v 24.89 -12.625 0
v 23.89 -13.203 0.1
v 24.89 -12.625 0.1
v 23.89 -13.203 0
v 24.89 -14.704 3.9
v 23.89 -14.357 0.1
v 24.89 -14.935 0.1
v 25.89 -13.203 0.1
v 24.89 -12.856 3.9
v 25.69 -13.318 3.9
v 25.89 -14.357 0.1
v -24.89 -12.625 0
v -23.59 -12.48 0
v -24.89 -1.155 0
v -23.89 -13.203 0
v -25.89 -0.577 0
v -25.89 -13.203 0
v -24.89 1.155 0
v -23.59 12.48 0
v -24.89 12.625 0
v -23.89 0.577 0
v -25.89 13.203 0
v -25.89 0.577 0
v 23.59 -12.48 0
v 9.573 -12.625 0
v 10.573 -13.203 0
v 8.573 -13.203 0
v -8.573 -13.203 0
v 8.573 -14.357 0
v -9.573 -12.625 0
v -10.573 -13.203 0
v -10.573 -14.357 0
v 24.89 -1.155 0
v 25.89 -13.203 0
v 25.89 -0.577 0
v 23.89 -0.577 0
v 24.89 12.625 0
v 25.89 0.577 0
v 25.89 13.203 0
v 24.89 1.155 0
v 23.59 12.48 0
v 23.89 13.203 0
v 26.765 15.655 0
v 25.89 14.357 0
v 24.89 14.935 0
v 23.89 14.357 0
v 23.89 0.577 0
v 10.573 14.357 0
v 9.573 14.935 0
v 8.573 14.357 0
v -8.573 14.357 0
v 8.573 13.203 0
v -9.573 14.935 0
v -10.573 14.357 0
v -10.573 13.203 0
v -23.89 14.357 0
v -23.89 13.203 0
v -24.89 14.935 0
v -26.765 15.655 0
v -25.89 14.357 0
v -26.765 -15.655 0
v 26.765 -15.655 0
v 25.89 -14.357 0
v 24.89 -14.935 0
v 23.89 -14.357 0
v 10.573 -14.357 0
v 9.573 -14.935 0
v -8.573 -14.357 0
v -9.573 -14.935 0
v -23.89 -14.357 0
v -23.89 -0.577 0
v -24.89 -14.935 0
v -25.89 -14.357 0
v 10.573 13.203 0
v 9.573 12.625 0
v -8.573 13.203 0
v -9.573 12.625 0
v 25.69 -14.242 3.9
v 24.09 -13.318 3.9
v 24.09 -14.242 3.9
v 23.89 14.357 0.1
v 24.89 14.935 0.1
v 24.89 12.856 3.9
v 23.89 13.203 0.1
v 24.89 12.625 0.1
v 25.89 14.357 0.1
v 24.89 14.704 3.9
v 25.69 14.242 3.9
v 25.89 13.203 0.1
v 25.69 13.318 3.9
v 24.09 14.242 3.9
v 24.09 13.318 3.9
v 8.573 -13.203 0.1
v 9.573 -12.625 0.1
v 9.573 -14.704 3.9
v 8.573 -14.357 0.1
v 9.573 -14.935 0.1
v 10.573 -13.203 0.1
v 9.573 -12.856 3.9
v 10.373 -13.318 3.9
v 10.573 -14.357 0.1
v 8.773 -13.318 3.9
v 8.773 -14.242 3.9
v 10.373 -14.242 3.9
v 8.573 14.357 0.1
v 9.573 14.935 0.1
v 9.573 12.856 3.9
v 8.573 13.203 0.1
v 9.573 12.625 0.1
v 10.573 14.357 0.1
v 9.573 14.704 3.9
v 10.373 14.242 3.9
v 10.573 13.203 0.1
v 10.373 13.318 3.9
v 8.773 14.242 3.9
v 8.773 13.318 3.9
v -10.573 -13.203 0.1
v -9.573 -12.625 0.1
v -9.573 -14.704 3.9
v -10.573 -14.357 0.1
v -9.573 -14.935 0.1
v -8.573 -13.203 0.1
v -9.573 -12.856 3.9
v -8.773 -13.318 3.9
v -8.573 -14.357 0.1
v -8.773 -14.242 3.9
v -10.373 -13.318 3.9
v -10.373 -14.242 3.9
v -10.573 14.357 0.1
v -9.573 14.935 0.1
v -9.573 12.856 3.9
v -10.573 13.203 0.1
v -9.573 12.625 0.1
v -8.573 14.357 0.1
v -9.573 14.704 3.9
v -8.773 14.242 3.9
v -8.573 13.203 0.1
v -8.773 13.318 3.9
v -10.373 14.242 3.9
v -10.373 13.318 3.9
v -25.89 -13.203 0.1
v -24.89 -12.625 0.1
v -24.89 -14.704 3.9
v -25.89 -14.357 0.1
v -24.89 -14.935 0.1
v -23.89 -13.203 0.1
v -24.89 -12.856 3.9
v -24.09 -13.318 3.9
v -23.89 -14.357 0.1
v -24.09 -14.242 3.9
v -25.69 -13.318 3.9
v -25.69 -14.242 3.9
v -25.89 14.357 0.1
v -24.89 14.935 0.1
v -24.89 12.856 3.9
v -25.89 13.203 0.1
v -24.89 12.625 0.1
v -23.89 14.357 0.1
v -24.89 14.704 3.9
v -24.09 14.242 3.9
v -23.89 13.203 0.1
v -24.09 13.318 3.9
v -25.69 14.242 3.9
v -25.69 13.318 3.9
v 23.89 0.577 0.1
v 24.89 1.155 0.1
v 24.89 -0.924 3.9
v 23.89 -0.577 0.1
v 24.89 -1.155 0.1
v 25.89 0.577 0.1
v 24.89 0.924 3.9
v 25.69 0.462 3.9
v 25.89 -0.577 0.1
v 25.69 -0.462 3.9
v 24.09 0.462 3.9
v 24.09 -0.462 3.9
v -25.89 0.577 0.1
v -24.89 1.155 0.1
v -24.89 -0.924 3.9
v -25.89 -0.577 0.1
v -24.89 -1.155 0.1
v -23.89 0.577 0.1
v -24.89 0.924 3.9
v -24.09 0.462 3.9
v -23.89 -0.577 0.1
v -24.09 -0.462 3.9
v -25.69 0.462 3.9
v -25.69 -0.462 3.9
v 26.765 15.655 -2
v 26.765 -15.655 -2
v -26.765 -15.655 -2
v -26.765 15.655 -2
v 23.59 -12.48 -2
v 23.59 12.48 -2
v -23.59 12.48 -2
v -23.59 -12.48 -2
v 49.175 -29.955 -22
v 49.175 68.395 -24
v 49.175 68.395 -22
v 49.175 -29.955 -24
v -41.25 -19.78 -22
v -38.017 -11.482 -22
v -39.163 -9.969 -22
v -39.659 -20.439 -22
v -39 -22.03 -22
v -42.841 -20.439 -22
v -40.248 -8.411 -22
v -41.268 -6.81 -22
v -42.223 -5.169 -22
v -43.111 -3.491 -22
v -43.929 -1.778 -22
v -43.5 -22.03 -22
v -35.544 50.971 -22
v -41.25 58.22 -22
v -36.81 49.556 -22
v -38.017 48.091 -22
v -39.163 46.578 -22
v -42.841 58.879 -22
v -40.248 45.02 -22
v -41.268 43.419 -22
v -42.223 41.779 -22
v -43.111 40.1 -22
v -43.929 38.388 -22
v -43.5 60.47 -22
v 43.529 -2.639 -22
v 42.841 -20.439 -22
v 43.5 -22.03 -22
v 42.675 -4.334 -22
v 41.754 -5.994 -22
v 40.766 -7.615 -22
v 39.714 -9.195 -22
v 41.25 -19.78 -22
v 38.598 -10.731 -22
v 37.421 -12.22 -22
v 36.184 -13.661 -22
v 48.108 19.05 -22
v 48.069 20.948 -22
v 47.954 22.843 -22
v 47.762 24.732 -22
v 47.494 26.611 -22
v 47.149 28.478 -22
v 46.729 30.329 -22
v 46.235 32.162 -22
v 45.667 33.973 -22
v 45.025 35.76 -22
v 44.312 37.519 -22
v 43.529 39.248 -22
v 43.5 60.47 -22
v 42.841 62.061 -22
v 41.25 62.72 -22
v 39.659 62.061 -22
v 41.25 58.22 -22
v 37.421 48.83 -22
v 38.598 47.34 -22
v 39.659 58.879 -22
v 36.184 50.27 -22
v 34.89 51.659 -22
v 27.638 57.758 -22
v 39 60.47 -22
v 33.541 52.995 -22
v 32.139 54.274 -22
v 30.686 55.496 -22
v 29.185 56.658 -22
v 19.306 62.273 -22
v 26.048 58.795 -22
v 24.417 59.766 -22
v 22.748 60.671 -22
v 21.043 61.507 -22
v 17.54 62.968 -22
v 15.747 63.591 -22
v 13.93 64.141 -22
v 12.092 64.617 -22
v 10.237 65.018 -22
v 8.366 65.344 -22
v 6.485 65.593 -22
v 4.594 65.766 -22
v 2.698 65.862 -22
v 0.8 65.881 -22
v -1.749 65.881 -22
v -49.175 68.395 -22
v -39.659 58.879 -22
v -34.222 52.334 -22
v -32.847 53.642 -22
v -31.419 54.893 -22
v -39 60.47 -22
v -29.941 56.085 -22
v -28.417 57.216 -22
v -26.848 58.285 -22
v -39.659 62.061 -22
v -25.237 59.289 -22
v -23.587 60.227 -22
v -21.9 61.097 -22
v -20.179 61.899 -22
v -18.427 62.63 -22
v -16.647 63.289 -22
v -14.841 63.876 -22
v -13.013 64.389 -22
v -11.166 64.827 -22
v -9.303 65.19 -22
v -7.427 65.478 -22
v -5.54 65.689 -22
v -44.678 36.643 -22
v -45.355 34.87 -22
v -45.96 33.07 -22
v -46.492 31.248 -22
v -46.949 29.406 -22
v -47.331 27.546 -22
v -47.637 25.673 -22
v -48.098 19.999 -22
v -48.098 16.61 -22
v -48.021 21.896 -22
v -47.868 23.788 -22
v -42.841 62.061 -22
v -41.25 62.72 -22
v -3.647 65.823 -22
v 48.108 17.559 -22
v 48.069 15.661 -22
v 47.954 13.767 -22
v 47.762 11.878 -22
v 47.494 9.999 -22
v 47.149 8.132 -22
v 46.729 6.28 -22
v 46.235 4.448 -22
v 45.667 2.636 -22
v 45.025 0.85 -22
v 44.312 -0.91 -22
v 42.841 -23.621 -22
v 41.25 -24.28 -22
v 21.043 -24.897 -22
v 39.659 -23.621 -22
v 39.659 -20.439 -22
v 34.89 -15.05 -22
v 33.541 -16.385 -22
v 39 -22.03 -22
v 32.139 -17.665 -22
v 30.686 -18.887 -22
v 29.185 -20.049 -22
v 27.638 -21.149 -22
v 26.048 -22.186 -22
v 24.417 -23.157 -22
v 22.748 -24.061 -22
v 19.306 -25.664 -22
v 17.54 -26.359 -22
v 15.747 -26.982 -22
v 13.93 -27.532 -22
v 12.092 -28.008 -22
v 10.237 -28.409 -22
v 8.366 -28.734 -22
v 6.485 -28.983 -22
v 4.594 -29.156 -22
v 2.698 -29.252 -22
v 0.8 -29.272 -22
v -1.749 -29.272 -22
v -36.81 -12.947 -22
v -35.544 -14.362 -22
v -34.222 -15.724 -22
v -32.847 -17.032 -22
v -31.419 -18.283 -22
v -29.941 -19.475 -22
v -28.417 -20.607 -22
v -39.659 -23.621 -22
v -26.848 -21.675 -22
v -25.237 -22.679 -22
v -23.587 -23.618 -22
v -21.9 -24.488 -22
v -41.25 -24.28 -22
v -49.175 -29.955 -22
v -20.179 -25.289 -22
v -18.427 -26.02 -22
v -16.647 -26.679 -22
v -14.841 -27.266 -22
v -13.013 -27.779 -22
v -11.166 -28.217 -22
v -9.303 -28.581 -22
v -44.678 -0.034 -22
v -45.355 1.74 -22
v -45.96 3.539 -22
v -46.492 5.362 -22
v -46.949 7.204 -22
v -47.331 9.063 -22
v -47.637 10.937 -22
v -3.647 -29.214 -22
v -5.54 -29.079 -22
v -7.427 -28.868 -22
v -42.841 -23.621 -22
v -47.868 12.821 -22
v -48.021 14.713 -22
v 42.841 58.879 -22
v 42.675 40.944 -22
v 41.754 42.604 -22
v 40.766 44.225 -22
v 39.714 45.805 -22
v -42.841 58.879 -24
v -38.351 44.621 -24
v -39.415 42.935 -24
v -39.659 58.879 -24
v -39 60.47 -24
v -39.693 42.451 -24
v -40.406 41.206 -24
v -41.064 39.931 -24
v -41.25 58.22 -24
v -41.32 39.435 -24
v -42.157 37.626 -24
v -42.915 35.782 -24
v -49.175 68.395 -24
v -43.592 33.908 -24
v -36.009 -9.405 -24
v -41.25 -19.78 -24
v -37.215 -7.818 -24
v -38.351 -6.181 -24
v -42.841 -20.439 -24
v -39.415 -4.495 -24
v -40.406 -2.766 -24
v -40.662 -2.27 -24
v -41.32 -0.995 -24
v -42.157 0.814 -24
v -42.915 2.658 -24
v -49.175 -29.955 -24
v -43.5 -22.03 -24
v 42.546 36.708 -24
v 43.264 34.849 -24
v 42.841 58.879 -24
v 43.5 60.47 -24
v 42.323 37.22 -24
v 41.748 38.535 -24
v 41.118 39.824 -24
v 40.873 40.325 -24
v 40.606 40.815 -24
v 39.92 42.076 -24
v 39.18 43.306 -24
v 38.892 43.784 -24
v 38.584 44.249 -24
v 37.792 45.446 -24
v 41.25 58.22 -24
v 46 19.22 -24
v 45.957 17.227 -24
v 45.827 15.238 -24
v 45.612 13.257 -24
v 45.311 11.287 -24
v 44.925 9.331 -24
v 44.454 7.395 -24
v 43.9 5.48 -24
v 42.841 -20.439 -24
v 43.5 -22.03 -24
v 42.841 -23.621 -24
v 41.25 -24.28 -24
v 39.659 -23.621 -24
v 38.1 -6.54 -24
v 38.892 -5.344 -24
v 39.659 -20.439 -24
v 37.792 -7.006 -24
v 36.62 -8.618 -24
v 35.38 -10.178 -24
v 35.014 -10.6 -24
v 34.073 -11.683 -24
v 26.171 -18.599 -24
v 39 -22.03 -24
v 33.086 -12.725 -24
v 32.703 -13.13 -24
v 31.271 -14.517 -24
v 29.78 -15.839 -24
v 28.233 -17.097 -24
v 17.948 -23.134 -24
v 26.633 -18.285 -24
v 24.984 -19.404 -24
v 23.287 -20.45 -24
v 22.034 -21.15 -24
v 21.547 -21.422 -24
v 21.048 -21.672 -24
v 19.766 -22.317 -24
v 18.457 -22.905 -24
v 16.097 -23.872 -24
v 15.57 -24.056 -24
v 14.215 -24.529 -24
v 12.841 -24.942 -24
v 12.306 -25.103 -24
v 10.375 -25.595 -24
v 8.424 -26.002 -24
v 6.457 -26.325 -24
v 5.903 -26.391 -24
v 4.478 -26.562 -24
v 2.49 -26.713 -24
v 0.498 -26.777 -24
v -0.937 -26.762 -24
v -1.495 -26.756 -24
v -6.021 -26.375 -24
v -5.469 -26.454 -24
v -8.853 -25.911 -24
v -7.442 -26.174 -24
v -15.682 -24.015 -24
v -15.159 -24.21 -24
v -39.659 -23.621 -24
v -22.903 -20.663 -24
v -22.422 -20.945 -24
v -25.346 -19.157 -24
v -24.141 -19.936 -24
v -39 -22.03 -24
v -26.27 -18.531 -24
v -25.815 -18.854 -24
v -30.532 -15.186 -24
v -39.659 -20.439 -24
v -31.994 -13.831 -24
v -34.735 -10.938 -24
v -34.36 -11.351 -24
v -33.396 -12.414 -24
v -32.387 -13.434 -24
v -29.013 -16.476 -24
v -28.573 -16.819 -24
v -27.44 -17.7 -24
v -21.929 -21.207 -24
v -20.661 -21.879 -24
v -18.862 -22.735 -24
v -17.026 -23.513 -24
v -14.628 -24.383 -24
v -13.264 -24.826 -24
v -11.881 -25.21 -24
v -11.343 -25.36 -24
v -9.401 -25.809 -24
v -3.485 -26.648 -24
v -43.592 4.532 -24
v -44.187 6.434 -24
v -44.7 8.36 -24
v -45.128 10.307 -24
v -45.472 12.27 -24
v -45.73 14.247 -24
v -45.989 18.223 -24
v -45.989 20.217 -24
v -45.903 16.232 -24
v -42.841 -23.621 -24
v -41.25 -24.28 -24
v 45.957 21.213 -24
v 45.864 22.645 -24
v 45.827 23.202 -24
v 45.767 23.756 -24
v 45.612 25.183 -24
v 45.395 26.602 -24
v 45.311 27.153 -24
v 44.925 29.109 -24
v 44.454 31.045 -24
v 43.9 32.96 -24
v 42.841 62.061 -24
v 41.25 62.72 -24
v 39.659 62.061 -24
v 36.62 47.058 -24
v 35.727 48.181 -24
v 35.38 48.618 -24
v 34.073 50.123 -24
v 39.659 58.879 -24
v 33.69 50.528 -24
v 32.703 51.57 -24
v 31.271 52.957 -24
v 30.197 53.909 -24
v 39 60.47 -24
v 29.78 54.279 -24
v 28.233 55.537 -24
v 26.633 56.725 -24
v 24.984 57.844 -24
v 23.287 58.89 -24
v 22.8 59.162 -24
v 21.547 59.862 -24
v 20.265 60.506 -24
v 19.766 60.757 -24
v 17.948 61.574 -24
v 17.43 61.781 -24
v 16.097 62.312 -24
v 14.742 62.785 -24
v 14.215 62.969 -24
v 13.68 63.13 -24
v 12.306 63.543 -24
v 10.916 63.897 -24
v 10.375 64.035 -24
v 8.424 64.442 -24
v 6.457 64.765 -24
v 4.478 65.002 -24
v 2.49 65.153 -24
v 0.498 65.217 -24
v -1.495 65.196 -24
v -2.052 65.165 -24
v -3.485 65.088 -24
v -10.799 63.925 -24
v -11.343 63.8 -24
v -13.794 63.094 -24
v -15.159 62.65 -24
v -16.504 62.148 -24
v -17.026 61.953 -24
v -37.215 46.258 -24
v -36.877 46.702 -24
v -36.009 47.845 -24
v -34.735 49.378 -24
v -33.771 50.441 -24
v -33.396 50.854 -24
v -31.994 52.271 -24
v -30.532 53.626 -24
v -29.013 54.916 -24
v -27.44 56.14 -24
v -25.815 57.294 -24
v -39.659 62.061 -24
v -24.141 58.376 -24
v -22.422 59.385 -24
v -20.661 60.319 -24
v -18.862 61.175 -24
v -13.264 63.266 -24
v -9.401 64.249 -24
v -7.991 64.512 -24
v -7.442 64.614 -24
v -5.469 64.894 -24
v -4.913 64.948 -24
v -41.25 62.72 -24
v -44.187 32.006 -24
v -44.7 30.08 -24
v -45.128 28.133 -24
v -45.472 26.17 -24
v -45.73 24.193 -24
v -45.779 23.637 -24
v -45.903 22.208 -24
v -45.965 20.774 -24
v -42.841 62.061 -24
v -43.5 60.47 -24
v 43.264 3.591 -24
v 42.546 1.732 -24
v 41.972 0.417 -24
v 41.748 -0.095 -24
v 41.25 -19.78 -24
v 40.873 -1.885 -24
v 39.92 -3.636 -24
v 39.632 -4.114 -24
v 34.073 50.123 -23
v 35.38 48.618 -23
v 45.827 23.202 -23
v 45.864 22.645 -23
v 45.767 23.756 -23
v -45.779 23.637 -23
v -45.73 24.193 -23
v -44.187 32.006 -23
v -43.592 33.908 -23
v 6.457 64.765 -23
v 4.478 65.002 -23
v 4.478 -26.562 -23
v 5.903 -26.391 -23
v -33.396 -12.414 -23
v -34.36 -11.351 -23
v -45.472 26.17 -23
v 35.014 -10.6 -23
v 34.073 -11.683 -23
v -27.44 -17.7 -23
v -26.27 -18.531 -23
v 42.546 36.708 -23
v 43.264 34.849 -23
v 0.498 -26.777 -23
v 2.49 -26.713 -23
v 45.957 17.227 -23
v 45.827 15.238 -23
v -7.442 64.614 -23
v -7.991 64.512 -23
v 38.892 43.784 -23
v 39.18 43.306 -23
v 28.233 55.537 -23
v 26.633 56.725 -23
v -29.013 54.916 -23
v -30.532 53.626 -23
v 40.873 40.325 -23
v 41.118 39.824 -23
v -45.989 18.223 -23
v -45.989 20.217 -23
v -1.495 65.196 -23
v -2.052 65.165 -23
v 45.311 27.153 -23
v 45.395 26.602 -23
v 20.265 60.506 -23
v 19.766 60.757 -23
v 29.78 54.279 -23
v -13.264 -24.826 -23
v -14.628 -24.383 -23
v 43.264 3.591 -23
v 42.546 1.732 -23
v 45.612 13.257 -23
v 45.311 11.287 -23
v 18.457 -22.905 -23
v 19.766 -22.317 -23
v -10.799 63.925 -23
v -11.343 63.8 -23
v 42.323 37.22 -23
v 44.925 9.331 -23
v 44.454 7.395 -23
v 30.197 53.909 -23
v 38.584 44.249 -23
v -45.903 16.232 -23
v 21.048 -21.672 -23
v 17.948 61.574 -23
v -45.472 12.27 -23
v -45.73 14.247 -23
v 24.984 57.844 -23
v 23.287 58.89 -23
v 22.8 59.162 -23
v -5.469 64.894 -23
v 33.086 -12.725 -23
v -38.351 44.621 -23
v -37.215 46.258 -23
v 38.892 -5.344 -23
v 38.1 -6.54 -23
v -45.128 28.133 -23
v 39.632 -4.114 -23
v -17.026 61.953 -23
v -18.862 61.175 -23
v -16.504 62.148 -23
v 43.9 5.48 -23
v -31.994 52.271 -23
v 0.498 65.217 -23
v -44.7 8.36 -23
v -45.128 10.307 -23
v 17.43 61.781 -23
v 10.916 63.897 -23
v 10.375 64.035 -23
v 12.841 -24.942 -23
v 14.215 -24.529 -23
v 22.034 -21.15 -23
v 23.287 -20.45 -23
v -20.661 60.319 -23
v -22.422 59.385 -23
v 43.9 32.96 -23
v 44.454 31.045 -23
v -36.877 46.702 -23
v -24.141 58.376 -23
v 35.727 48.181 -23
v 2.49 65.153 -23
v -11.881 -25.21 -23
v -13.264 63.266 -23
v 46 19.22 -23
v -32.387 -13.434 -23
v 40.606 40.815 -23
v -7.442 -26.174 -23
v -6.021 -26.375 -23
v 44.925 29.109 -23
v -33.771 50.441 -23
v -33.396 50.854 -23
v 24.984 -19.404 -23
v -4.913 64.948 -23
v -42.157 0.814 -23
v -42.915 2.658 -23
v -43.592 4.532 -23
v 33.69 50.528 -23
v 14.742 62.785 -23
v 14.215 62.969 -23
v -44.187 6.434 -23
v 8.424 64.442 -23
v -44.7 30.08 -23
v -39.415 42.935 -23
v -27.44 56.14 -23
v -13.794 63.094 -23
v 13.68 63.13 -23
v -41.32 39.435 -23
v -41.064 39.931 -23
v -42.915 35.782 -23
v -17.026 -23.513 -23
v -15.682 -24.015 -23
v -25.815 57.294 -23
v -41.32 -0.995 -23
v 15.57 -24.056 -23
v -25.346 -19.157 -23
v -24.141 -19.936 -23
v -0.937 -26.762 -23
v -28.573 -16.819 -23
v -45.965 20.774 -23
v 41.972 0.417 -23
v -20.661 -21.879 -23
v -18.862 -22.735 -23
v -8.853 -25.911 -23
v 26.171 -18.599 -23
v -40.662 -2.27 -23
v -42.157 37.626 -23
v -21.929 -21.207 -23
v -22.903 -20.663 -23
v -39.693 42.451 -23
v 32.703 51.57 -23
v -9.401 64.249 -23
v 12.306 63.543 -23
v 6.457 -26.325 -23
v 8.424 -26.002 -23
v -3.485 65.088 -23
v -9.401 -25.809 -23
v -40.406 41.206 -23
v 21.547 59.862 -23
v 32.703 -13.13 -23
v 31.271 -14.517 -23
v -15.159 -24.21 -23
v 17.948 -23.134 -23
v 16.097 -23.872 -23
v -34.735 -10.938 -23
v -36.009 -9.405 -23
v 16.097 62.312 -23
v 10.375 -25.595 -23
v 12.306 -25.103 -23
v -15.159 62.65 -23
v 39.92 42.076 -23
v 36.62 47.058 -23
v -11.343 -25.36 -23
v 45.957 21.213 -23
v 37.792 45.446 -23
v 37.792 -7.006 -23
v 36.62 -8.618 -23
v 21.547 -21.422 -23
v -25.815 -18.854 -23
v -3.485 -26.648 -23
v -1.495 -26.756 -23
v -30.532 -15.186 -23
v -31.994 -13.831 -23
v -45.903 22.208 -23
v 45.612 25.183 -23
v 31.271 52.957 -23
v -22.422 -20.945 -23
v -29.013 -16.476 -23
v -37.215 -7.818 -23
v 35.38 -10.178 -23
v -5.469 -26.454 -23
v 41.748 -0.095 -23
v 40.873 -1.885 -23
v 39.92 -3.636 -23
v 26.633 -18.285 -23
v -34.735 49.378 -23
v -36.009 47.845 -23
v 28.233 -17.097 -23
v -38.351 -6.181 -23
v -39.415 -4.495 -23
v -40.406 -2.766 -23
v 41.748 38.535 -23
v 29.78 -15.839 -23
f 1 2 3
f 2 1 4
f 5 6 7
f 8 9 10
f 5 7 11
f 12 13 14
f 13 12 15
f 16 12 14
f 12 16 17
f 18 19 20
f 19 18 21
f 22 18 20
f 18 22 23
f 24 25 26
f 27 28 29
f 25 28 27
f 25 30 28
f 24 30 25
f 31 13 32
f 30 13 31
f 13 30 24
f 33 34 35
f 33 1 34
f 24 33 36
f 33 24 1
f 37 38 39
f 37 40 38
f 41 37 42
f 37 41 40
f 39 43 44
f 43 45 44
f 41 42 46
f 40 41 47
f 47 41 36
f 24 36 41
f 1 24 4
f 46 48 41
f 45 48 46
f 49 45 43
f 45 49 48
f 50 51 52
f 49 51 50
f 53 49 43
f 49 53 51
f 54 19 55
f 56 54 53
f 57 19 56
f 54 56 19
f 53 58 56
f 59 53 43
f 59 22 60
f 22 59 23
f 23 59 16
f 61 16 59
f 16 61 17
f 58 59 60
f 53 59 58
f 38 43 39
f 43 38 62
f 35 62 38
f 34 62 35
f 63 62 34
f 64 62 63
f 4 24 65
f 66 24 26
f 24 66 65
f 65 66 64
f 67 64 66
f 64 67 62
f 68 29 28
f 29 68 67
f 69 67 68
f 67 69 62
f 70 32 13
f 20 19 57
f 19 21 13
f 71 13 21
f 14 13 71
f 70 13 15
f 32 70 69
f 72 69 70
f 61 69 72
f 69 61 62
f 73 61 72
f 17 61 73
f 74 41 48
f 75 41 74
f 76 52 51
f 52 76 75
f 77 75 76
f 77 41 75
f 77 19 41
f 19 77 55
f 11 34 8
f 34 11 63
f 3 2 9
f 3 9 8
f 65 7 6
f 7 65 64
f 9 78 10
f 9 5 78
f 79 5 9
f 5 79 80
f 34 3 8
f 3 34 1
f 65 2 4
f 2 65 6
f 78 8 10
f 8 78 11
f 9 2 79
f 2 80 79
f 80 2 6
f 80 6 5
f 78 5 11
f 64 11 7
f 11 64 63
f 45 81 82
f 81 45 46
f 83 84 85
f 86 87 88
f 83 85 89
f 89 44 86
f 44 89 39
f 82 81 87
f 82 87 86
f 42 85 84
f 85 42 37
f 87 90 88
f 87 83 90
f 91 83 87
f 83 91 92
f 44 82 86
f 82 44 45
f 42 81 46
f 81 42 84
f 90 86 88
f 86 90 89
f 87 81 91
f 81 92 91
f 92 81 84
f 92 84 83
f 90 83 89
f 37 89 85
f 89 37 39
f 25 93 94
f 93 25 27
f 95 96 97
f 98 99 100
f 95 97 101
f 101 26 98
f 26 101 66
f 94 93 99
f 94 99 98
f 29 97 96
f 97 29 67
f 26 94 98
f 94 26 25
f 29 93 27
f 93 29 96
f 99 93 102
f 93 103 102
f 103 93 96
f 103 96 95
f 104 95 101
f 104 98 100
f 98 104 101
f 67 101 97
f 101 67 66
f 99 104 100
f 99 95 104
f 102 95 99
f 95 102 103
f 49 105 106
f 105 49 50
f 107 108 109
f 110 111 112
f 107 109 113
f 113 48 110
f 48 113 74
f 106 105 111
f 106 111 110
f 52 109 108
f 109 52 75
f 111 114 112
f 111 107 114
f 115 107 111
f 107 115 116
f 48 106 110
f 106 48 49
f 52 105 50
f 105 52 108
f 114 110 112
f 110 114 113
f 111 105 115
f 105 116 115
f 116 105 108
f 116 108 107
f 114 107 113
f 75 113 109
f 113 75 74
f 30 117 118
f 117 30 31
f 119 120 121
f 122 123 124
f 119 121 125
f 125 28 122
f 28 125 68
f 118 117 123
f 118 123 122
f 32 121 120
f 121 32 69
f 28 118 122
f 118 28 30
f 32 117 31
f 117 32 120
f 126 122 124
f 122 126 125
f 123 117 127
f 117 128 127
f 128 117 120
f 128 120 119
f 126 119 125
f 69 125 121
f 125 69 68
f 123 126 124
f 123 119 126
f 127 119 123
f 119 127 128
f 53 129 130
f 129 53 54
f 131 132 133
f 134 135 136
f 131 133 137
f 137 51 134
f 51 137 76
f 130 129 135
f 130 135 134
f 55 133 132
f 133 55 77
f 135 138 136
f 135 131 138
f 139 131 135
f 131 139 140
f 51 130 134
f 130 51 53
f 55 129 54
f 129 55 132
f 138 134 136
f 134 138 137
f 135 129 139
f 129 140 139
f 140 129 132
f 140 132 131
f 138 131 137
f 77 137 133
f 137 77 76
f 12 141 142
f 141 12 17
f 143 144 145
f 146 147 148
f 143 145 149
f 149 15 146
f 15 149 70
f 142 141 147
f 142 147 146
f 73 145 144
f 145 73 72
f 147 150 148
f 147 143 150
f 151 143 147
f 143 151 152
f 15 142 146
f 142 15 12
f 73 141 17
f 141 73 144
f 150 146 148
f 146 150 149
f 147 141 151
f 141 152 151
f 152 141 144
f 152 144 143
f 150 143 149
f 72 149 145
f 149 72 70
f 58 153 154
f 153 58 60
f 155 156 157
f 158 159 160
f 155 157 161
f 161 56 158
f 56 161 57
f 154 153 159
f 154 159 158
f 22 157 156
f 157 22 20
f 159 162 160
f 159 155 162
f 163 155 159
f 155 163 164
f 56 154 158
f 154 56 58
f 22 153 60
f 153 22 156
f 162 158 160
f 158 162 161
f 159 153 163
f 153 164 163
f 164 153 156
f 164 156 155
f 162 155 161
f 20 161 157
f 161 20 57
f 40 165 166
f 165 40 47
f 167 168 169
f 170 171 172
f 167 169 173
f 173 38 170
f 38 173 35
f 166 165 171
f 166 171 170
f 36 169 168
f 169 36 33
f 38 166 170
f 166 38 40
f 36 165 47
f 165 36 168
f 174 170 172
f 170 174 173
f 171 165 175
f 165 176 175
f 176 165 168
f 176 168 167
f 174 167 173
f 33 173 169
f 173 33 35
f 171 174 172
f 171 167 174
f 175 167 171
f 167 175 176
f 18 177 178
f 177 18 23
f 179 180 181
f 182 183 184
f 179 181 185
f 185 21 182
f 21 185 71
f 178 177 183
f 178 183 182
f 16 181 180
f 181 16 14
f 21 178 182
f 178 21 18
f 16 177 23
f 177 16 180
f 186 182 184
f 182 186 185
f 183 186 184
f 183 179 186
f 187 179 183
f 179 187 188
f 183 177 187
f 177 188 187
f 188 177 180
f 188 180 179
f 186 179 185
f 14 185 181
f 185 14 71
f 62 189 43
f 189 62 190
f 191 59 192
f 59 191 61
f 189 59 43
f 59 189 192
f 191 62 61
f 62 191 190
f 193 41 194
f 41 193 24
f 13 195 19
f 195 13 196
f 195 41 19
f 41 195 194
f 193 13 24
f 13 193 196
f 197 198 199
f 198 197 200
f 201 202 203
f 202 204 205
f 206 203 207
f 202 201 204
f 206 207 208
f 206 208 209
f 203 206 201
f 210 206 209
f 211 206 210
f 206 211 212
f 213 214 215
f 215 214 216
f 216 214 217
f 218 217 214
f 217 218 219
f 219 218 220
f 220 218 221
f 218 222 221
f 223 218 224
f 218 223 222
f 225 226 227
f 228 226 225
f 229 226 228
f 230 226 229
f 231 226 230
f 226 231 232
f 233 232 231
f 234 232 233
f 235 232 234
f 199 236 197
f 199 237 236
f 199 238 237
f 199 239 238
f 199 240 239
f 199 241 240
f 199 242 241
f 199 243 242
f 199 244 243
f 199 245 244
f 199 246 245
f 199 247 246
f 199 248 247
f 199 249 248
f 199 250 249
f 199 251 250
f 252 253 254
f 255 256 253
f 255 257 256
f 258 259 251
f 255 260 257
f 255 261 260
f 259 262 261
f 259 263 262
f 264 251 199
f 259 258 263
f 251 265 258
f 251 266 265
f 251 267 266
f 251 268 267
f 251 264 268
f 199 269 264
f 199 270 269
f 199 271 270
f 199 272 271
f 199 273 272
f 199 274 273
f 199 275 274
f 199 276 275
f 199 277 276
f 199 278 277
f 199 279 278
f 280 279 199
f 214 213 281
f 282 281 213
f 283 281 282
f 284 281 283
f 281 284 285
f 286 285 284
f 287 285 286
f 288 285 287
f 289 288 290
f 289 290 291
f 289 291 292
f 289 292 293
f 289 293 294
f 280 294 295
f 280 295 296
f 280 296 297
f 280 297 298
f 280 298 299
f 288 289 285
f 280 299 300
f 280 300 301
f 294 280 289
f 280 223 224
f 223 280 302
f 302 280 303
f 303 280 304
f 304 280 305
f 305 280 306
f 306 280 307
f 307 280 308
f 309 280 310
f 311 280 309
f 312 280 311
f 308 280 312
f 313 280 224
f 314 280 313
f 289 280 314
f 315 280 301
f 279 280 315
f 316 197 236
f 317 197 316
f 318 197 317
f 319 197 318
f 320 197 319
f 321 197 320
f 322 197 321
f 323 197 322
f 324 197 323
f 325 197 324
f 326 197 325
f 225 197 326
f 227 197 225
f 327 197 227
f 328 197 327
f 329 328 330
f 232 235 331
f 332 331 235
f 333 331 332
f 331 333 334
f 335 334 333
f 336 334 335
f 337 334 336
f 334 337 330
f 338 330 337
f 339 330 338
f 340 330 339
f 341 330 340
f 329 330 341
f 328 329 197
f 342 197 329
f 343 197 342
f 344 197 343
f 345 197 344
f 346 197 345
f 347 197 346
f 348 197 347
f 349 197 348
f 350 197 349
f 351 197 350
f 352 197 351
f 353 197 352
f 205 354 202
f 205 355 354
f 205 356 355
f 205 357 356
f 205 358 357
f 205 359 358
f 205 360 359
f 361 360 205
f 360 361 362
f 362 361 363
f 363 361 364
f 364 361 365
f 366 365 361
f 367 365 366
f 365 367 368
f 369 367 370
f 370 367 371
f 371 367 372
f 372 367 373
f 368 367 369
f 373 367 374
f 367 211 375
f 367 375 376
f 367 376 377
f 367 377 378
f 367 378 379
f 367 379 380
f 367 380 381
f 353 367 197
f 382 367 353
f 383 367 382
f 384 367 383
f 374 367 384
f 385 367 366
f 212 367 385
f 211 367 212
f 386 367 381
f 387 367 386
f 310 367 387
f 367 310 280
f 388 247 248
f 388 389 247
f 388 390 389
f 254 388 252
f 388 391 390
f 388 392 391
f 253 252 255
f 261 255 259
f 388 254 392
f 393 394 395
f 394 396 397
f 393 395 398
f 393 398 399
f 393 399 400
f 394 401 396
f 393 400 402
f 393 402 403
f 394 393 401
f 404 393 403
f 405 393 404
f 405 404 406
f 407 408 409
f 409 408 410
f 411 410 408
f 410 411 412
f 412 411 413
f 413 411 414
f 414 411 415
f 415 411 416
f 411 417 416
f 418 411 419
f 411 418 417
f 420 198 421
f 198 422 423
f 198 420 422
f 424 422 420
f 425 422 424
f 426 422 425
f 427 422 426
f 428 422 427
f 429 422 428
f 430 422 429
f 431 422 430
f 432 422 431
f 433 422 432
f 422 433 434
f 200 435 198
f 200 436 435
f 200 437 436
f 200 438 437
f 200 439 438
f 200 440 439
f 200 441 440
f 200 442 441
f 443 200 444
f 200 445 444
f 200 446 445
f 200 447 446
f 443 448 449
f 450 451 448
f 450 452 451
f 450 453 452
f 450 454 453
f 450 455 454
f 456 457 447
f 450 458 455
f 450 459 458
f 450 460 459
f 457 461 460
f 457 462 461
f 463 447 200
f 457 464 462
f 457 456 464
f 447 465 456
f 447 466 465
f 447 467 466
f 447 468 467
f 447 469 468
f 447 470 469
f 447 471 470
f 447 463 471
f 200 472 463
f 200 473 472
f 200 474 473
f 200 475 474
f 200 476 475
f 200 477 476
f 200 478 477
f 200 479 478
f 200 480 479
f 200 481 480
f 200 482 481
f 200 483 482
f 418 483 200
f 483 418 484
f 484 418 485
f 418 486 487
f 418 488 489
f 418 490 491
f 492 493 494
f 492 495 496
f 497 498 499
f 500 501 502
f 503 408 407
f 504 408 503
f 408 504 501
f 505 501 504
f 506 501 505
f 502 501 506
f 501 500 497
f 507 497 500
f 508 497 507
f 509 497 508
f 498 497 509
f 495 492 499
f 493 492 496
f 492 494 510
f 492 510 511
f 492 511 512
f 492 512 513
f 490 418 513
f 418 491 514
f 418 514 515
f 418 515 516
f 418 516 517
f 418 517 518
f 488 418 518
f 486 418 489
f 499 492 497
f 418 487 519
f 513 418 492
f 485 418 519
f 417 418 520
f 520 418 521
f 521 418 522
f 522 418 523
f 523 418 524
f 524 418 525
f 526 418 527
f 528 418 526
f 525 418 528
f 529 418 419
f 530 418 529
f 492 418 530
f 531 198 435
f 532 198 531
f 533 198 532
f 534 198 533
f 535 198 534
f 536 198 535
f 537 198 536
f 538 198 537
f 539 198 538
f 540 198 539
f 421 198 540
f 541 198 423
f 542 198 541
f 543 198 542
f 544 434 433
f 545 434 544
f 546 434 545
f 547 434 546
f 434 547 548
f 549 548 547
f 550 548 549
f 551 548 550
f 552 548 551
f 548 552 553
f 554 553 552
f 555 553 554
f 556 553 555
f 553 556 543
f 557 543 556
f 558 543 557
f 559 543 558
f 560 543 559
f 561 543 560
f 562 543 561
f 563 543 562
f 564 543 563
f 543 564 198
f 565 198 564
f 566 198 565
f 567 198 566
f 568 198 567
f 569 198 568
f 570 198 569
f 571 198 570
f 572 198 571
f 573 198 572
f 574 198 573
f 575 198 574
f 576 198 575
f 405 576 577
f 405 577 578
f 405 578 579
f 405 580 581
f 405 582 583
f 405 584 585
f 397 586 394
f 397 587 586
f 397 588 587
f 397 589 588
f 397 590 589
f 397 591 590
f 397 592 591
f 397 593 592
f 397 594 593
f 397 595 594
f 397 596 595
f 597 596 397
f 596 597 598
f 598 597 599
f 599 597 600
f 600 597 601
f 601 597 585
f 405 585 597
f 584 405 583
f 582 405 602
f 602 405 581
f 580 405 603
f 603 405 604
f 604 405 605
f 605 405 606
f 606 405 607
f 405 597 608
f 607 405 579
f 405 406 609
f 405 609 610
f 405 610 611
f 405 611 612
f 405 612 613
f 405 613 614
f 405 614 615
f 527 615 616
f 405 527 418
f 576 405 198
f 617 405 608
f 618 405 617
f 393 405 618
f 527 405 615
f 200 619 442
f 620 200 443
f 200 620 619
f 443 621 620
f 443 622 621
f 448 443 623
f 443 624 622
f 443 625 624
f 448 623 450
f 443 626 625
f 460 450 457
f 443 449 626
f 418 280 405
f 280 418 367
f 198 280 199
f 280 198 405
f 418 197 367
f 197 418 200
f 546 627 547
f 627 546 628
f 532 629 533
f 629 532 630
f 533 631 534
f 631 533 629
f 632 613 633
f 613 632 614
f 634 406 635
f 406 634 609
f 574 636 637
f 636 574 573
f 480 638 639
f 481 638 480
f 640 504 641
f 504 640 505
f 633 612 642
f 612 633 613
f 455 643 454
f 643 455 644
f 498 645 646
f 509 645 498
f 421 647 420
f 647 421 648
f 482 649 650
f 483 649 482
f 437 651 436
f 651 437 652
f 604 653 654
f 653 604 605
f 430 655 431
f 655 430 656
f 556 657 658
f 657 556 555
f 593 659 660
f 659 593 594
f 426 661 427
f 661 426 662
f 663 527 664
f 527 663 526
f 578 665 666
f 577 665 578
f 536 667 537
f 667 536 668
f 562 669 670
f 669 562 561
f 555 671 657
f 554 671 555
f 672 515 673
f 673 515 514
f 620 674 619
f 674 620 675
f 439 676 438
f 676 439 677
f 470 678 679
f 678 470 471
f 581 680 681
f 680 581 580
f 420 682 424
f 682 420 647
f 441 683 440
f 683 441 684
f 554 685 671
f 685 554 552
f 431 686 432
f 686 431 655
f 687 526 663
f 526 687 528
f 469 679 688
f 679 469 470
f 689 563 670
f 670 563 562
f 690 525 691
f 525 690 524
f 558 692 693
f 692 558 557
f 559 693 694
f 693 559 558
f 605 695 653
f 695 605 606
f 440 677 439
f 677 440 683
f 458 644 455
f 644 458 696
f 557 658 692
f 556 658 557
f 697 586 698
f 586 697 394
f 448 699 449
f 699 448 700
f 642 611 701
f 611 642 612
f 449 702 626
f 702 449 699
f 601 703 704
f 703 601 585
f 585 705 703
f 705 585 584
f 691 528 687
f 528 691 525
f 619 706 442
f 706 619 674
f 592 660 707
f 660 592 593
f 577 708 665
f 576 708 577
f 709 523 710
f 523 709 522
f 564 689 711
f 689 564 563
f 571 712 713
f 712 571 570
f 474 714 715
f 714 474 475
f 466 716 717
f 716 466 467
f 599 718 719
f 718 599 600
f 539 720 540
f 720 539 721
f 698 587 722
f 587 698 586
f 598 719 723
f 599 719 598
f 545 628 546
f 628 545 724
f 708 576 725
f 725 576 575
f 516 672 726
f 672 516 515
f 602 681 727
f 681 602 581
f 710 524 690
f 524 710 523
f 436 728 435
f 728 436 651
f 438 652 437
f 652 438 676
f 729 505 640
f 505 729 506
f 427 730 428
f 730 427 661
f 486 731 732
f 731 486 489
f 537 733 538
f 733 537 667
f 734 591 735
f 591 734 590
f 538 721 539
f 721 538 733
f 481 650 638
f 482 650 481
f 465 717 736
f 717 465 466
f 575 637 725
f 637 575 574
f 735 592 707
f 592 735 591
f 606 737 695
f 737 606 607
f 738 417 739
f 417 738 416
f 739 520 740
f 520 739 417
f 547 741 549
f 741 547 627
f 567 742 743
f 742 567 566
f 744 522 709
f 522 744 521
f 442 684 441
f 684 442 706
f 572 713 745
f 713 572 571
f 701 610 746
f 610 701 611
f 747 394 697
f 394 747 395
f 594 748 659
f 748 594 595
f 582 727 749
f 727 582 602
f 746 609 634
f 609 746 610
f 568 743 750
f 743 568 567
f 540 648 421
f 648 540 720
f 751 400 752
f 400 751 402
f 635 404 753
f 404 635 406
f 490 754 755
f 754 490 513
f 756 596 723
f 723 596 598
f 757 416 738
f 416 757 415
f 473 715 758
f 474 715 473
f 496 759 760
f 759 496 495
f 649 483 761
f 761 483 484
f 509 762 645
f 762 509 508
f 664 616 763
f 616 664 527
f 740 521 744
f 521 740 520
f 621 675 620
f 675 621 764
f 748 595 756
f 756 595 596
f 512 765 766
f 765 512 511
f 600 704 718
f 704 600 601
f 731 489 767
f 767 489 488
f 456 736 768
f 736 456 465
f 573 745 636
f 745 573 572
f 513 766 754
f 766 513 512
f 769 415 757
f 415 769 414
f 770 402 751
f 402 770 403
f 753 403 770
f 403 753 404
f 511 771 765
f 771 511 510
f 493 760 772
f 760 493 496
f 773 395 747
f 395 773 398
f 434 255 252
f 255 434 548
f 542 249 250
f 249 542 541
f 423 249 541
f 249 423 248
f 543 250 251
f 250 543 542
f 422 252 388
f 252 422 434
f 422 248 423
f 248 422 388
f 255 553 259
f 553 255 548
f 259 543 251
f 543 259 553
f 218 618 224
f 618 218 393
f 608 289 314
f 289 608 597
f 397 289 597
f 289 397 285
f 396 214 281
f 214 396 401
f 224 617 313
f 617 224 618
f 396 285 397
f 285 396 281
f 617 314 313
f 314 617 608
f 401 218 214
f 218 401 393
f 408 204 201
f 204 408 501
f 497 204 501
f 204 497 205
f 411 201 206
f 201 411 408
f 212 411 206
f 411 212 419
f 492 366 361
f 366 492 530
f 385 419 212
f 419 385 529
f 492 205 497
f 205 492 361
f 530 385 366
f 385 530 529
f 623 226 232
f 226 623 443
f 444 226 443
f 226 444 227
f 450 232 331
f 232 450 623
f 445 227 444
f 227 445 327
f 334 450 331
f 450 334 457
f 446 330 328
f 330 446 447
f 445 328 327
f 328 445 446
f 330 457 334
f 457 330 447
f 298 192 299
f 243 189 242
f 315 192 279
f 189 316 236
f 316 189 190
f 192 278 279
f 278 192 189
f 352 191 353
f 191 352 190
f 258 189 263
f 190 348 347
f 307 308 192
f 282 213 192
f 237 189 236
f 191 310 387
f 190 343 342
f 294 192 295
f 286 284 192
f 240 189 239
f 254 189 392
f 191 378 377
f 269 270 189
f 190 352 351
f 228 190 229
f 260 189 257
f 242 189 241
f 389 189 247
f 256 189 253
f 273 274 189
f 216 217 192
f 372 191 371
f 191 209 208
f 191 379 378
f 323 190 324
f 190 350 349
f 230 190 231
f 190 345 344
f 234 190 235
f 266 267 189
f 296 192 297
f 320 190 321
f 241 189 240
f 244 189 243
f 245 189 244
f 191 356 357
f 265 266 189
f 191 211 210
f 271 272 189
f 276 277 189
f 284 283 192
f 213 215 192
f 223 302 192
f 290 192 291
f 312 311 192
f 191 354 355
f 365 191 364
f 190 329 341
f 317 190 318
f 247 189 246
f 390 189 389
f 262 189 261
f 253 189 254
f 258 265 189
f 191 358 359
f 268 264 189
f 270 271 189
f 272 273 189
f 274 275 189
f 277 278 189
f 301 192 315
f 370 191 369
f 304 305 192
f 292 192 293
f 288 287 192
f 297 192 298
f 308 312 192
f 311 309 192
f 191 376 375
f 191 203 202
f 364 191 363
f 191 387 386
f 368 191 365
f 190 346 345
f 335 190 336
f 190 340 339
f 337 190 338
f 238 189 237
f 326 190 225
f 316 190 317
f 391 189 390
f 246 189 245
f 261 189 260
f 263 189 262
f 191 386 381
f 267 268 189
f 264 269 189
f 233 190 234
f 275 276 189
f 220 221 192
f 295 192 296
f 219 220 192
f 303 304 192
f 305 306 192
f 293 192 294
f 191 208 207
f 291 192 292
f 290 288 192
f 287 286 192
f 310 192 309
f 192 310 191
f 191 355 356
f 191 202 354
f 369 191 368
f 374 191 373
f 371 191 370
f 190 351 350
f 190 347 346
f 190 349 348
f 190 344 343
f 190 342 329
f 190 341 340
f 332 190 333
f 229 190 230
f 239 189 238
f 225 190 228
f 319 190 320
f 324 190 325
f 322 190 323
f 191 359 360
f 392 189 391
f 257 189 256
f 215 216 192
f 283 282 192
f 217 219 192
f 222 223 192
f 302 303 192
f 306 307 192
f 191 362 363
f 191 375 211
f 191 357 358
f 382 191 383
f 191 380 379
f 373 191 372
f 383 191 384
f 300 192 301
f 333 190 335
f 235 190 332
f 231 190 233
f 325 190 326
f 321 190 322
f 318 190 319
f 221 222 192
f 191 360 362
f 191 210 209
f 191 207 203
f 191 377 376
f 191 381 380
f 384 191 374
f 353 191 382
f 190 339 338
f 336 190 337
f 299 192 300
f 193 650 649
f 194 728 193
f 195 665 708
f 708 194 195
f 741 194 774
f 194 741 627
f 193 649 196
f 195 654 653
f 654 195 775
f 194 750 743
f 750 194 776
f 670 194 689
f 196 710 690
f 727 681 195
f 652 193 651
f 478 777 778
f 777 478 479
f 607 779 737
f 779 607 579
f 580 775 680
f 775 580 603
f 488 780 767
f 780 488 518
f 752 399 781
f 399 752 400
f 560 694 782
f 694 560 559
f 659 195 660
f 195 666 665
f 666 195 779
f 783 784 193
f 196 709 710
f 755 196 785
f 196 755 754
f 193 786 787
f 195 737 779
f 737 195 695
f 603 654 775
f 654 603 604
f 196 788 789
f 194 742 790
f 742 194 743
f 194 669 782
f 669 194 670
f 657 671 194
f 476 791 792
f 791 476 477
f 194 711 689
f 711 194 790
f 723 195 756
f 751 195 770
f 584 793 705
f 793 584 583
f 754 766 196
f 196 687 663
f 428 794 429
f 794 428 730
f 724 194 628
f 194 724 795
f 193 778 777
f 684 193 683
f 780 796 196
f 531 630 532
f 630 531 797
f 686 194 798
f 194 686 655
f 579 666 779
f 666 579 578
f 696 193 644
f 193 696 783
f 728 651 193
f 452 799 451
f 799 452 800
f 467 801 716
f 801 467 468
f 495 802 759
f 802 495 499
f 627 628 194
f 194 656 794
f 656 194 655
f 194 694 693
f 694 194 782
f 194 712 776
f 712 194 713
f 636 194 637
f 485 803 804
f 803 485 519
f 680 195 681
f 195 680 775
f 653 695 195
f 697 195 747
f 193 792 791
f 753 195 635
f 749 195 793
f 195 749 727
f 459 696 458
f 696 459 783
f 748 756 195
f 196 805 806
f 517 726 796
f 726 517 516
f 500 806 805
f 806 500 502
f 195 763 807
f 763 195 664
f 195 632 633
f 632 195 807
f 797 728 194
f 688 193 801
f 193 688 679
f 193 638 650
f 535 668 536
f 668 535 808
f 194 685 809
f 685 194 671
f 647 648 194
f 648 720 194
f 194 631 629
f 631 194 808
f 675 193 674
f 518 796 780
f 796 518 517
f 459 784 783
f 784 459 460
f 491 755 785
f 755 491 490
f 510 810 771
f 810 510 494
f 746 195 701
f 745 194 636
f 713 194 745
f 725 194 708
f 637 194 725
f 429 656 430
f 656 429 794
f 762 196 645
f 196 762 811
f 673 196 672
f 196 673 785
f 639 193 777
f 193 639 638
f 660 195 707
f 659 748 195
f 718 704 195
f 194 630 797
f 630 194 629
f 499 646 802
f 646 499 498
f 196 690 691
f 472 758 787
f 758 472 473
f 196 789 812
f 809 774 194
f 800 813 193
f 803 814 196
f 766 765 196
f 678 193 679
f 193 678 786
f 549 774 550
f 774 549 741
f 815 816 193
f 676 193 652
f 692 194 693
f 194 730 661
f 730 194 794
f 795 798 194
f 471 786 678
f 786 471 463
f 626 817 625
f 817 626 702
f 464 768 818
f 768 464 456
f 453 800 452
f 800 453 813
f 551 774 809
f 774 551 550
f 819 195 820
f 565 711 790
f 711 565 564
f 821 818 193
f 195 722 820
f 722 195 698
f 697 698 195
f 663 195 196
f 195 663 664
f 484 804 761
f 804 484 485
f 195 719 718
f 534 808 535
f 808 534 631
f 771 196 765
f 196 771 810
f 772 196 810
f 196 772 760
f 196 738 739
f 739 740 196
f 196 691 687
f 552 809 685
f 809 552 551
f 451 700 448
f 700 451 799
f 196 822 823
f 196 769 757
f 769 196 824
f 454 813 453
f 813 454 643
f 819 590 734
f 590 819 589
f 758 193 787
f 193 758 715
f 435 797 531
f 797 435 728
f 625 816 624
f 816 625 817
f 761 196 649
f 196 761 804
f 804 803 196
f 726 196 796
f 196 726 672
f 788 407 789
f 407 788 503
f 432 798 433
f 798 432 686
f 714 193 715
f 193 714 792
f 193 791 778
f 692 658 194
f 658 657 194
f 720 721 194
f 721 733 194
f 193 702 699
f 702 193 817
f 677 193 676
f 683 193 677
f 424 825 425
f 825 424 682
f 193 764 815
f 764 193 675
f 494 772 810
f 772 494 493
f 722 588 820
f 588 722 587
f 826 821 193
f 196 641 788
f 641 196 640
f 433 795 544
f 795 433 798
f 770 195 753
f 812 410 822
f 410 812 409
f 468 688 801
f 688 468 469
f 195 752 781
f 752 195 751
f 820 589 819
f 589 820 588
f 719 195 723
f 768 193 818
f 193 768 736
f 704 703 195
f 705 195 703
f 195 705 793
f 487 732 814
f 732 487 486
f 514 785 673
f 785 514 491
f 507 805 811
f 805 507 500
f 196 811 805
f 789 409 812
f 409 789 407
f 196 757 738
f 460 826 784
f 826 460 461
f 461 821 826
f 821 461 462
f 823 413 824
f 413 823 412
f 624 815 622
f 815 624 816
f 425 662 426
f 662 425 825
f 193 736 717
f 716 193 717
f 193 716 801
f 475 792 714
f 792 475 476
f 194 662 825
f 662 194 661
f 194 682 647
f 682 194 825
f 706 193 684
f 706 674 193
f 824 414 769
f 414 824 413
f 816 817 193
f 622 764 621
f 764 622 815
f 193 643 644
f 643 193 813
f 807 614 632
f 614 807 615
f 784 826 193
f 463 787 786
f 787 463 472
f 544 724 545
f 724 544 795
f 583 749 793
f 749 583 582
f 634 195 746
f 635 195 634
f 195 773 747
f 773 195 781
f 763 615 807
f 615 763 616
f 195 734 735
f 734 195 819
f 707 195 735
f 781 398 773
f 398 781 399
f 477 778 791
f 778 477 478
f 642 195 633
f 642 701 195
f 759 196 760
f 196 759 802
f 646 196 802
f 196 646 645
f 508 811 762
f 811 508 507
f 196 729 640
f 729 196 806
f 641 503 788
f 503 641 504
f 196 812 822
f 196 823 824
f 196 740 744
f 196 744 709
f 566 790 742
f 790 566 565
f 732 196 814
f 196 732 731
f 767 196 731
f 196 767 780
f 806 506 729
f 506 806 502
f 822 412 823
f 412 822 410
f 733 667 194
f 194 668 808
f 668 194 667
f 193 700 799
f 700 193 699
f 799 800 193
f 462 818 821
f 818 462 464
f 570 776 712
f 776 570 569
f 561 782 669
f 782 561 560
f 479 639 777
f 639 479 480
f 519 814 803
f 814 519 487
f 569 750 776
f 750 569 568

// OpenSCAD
// Base measurements

// Projector-side intake grille. Measured from outer edge of outer hexagon air holes
rectWidth = 52.38;
rectHeight = 30.16;

// Pegs inserting into projector air grille
pegHeight = 4;
pegDiameter = 2;
pegHoleDiameter = 2.6; // Used to ensure peg placement remains constant as pegDiameter changes
numPegsHorizontal = 14;
numPegsVertical = 5;
// Which pegs to include:
horizontalPegs = [1, 0, 0, 0, 1, 0, 0, 0, 0, 1, 0, 0, 0, 1];
verticalPegs=[0, 0, 1, 0, 0];

// External fan
circleRadius = (92 / 2);
circularFlangeScrewHoleDistance = 82.5;
screwHoleDiameter=4.5;

// Adapter
// Depth of extruded hull
extrusionHeight = 20;
// Amount of headspace available above projector intake vent (Important to avoid intersecting mounting hardware)
rearFanDistanceAboveRectTop = 11.7;
flangeHeight = 2;
hullThickness = 3.175;

// Derived measurements
pegRadius = pegDiameter / 2;
pegHoleRadius = pegHoleDiameter / 2;
halfRectWidth = rectWidth / 2;
halfRectHeight = rectHeight / 2;
 
 // Hexapegs
 
pegStartX = halfRectWidth - pegHoleRadius;
pegStopX = -halfRectWidth + pegHoleRadius;
 
pegPaddingHorizontal = ((pegStartX - pegStopX) / (numPegsHorizontal - 1)) - pegHoleDiameter;
pegIntervalX = pegHoleDiameter + pegPaddingHorizontal;

// Pegs along "horizontal" larger rectangular edge (X-axis)
for (peg = [0:1:numPegsHorizontal-1]) {
    pegX = pegStartX - (peg * pegIntervalX);
    if (horizontalPegs[peg] != 0) {
        // Top
        translate([pegX, (-halfRectHeight) + pegHoleRadius, 0 ]) taperedHexapeg(pegHeight, pegRadius);
        // Bottom
        translate([pegX, halfRectHeight - pegHoleRadius, 0 ]) taperedHexapeg(pegHeight, pegRadius);
    }
}
    
// Pegs along "vertical" smaller rectangular edge (Y-axis)
pegStartY = halfRectHeight - pegHoleRadius;
pegStopY = (-halfRectHeight) + pegHoleRadius;

pegPaddingVertical = ((pegStartY - pegStopY) / (numPegsVertical - 1)) - pegHoleDiameter;
pegIntervalY = pegHoleDiameter + pegPaddingVertical;

// Vertical pegs
for (peg = [0:1:numPegsVertical-1]) {
    pegY = pegStartY - (peg * pegIntervalY);
    if (verticalPegs[peg] != 0) {
        // Left
        translate([pegStartX, pegY, 0 ]) taperedHexapeg(pegHeight, pegRadius);
        // Right
        translate([pegStopX, pegY, 0 ]) taperedHexapeg(pegHeight, pegRadius);
    }
}

 // Rectangular-side flange
pegAllowance = pegHoleDiameter;  // Radius / Diameter are measured flat edge to edge. Corner-corner distance is slightly greater. TODO: Do the trigonometry
innerWidth = rectWidth - (2 * pegAllowance);
innerHeight = rectHeight - (2 * pegAllowance);
outerWidth = innerWidth + (hullThickness * 2);
outerHeight = innerHeight + (hullThickness * 2);


 translate([0,0,-flangeHeight]) difference() {
     rectangularbase(outerWidth, outerHeight, flangeHeight);
     rectangularbase(innerWidth, innerHeight, flangeHeight);
 }
 
 // Circular-side flange
bottomCircleOffset = circleRadius - rectHeight/2 - rearFanDistanceAboveRectTop;

circularSideFlangeDimen = (circleRadius * 2) + (2 * hullThickness);

translate([0, bottomCircleOffset, -flangeHeight * 2 - extrusionHeight]) difference() {
     
    rectangularbase(circularSideFlangeDimen, circularSideFlangeDimen, flangeHeight);
    cylinder(r=circleRadius, h=flangeHeight, $fa = 1);
     
     // Screw holes
     // Bottom Right looking through circle at rectangle
     translate([circularFlangeScrewHoleDistance/2, circularFlangeScrewHoleDistance/2, 0]) cylinder(r=screwHoleDiameter/2 , h=flangeHeight);
     
     // Bottom Left
     translate([-circularFlangeScrewHoleDistance/2, circularFlangeScrewHoleDistance/2, 0]) cylinder(r=screwHoleDiameter/2 , h=flangeHeight);
     
     // Top Left
     translate([-circularFlangeScrewHoleDistance/2, -circularFlangeScrewHoleDistance/2, 0]) cylinder(r=screwHoleDiameter/2 , h=flangeHeight);
     
     // Top Right
     translate([circularFlangeScrewHoleDistance/2, -circularFlangeScrewHoleDistance/2, 0]) cylinder(r=screwHoleDiameter/2 , h=flangeHeight);
 }

 
// Hull
 
translate([0,0,-flangeHeight * 2]) difference() {
    // Outer hull
    adapterHull(outerWidth, outerHeight, circleRadius + hullThickness, extrusionHeight, rearFanDistanceAboveRectTop, flangeHeight);

    // Inner hull
    adapterHull(innerWidth, innerHeight, circleRadius, extrusionHeight, rearFanDistanceAboveRectTop, flangeHeight);
}

module adapterHull(rectWidth, rectHeight, circleRadius, hullHeight, rectTopToCircleTopOffset, flangeHeight) {
    
    //rectToCircleOffset = -(rectHeight / 2) - circleRadius - rectTopToCircleTopOffset;
    hull() {
        rectangularbase(rectWidth, rectHeight, flangeHeight);

        translate([0, bottomCircleOffset, -hullHeight]) cylinder(r=circleRadius, height = 1, $fa = 1);
        
    }
}

module rectangularbase(rectWidth, rectHeight, depth) {
    translate([-rectWidth/2,-rectHeight/2, 0]) cube([rectWidth, rectHeight, depth]);
}

module taperedHexapeg(pegHeight, pegRadius) {
    minHeight = .1;
    extrudeHeight = pegHeight - (minHeight * 2);
    hull() {
        hexapeg(minHeight, pegRadius);
        translate([0,0, extrudeHeight]) hexapeg(minHeight, pegRadius * .8);
    }
}

module hexapeg(pegHeight, pegRadius) {
    linear_extrude(height = pegHeight) {
        hexagon(pegRadius,0,0);
    }
}

module hexagon(r,x,y){

polygon(points=[[(r+x),(r*(tan(30)))+y],
                [x,(r*(2/sqrt(3)))+y],
                [-r+x,(r*(tan(30)))+y],
                [-r+x,-(r*(tan(30)))+y],
                [x,-(r*(2/sqrt(3)))+y], 
                [r+x,-(r*(tan(30)))+y]]);
         
 }
